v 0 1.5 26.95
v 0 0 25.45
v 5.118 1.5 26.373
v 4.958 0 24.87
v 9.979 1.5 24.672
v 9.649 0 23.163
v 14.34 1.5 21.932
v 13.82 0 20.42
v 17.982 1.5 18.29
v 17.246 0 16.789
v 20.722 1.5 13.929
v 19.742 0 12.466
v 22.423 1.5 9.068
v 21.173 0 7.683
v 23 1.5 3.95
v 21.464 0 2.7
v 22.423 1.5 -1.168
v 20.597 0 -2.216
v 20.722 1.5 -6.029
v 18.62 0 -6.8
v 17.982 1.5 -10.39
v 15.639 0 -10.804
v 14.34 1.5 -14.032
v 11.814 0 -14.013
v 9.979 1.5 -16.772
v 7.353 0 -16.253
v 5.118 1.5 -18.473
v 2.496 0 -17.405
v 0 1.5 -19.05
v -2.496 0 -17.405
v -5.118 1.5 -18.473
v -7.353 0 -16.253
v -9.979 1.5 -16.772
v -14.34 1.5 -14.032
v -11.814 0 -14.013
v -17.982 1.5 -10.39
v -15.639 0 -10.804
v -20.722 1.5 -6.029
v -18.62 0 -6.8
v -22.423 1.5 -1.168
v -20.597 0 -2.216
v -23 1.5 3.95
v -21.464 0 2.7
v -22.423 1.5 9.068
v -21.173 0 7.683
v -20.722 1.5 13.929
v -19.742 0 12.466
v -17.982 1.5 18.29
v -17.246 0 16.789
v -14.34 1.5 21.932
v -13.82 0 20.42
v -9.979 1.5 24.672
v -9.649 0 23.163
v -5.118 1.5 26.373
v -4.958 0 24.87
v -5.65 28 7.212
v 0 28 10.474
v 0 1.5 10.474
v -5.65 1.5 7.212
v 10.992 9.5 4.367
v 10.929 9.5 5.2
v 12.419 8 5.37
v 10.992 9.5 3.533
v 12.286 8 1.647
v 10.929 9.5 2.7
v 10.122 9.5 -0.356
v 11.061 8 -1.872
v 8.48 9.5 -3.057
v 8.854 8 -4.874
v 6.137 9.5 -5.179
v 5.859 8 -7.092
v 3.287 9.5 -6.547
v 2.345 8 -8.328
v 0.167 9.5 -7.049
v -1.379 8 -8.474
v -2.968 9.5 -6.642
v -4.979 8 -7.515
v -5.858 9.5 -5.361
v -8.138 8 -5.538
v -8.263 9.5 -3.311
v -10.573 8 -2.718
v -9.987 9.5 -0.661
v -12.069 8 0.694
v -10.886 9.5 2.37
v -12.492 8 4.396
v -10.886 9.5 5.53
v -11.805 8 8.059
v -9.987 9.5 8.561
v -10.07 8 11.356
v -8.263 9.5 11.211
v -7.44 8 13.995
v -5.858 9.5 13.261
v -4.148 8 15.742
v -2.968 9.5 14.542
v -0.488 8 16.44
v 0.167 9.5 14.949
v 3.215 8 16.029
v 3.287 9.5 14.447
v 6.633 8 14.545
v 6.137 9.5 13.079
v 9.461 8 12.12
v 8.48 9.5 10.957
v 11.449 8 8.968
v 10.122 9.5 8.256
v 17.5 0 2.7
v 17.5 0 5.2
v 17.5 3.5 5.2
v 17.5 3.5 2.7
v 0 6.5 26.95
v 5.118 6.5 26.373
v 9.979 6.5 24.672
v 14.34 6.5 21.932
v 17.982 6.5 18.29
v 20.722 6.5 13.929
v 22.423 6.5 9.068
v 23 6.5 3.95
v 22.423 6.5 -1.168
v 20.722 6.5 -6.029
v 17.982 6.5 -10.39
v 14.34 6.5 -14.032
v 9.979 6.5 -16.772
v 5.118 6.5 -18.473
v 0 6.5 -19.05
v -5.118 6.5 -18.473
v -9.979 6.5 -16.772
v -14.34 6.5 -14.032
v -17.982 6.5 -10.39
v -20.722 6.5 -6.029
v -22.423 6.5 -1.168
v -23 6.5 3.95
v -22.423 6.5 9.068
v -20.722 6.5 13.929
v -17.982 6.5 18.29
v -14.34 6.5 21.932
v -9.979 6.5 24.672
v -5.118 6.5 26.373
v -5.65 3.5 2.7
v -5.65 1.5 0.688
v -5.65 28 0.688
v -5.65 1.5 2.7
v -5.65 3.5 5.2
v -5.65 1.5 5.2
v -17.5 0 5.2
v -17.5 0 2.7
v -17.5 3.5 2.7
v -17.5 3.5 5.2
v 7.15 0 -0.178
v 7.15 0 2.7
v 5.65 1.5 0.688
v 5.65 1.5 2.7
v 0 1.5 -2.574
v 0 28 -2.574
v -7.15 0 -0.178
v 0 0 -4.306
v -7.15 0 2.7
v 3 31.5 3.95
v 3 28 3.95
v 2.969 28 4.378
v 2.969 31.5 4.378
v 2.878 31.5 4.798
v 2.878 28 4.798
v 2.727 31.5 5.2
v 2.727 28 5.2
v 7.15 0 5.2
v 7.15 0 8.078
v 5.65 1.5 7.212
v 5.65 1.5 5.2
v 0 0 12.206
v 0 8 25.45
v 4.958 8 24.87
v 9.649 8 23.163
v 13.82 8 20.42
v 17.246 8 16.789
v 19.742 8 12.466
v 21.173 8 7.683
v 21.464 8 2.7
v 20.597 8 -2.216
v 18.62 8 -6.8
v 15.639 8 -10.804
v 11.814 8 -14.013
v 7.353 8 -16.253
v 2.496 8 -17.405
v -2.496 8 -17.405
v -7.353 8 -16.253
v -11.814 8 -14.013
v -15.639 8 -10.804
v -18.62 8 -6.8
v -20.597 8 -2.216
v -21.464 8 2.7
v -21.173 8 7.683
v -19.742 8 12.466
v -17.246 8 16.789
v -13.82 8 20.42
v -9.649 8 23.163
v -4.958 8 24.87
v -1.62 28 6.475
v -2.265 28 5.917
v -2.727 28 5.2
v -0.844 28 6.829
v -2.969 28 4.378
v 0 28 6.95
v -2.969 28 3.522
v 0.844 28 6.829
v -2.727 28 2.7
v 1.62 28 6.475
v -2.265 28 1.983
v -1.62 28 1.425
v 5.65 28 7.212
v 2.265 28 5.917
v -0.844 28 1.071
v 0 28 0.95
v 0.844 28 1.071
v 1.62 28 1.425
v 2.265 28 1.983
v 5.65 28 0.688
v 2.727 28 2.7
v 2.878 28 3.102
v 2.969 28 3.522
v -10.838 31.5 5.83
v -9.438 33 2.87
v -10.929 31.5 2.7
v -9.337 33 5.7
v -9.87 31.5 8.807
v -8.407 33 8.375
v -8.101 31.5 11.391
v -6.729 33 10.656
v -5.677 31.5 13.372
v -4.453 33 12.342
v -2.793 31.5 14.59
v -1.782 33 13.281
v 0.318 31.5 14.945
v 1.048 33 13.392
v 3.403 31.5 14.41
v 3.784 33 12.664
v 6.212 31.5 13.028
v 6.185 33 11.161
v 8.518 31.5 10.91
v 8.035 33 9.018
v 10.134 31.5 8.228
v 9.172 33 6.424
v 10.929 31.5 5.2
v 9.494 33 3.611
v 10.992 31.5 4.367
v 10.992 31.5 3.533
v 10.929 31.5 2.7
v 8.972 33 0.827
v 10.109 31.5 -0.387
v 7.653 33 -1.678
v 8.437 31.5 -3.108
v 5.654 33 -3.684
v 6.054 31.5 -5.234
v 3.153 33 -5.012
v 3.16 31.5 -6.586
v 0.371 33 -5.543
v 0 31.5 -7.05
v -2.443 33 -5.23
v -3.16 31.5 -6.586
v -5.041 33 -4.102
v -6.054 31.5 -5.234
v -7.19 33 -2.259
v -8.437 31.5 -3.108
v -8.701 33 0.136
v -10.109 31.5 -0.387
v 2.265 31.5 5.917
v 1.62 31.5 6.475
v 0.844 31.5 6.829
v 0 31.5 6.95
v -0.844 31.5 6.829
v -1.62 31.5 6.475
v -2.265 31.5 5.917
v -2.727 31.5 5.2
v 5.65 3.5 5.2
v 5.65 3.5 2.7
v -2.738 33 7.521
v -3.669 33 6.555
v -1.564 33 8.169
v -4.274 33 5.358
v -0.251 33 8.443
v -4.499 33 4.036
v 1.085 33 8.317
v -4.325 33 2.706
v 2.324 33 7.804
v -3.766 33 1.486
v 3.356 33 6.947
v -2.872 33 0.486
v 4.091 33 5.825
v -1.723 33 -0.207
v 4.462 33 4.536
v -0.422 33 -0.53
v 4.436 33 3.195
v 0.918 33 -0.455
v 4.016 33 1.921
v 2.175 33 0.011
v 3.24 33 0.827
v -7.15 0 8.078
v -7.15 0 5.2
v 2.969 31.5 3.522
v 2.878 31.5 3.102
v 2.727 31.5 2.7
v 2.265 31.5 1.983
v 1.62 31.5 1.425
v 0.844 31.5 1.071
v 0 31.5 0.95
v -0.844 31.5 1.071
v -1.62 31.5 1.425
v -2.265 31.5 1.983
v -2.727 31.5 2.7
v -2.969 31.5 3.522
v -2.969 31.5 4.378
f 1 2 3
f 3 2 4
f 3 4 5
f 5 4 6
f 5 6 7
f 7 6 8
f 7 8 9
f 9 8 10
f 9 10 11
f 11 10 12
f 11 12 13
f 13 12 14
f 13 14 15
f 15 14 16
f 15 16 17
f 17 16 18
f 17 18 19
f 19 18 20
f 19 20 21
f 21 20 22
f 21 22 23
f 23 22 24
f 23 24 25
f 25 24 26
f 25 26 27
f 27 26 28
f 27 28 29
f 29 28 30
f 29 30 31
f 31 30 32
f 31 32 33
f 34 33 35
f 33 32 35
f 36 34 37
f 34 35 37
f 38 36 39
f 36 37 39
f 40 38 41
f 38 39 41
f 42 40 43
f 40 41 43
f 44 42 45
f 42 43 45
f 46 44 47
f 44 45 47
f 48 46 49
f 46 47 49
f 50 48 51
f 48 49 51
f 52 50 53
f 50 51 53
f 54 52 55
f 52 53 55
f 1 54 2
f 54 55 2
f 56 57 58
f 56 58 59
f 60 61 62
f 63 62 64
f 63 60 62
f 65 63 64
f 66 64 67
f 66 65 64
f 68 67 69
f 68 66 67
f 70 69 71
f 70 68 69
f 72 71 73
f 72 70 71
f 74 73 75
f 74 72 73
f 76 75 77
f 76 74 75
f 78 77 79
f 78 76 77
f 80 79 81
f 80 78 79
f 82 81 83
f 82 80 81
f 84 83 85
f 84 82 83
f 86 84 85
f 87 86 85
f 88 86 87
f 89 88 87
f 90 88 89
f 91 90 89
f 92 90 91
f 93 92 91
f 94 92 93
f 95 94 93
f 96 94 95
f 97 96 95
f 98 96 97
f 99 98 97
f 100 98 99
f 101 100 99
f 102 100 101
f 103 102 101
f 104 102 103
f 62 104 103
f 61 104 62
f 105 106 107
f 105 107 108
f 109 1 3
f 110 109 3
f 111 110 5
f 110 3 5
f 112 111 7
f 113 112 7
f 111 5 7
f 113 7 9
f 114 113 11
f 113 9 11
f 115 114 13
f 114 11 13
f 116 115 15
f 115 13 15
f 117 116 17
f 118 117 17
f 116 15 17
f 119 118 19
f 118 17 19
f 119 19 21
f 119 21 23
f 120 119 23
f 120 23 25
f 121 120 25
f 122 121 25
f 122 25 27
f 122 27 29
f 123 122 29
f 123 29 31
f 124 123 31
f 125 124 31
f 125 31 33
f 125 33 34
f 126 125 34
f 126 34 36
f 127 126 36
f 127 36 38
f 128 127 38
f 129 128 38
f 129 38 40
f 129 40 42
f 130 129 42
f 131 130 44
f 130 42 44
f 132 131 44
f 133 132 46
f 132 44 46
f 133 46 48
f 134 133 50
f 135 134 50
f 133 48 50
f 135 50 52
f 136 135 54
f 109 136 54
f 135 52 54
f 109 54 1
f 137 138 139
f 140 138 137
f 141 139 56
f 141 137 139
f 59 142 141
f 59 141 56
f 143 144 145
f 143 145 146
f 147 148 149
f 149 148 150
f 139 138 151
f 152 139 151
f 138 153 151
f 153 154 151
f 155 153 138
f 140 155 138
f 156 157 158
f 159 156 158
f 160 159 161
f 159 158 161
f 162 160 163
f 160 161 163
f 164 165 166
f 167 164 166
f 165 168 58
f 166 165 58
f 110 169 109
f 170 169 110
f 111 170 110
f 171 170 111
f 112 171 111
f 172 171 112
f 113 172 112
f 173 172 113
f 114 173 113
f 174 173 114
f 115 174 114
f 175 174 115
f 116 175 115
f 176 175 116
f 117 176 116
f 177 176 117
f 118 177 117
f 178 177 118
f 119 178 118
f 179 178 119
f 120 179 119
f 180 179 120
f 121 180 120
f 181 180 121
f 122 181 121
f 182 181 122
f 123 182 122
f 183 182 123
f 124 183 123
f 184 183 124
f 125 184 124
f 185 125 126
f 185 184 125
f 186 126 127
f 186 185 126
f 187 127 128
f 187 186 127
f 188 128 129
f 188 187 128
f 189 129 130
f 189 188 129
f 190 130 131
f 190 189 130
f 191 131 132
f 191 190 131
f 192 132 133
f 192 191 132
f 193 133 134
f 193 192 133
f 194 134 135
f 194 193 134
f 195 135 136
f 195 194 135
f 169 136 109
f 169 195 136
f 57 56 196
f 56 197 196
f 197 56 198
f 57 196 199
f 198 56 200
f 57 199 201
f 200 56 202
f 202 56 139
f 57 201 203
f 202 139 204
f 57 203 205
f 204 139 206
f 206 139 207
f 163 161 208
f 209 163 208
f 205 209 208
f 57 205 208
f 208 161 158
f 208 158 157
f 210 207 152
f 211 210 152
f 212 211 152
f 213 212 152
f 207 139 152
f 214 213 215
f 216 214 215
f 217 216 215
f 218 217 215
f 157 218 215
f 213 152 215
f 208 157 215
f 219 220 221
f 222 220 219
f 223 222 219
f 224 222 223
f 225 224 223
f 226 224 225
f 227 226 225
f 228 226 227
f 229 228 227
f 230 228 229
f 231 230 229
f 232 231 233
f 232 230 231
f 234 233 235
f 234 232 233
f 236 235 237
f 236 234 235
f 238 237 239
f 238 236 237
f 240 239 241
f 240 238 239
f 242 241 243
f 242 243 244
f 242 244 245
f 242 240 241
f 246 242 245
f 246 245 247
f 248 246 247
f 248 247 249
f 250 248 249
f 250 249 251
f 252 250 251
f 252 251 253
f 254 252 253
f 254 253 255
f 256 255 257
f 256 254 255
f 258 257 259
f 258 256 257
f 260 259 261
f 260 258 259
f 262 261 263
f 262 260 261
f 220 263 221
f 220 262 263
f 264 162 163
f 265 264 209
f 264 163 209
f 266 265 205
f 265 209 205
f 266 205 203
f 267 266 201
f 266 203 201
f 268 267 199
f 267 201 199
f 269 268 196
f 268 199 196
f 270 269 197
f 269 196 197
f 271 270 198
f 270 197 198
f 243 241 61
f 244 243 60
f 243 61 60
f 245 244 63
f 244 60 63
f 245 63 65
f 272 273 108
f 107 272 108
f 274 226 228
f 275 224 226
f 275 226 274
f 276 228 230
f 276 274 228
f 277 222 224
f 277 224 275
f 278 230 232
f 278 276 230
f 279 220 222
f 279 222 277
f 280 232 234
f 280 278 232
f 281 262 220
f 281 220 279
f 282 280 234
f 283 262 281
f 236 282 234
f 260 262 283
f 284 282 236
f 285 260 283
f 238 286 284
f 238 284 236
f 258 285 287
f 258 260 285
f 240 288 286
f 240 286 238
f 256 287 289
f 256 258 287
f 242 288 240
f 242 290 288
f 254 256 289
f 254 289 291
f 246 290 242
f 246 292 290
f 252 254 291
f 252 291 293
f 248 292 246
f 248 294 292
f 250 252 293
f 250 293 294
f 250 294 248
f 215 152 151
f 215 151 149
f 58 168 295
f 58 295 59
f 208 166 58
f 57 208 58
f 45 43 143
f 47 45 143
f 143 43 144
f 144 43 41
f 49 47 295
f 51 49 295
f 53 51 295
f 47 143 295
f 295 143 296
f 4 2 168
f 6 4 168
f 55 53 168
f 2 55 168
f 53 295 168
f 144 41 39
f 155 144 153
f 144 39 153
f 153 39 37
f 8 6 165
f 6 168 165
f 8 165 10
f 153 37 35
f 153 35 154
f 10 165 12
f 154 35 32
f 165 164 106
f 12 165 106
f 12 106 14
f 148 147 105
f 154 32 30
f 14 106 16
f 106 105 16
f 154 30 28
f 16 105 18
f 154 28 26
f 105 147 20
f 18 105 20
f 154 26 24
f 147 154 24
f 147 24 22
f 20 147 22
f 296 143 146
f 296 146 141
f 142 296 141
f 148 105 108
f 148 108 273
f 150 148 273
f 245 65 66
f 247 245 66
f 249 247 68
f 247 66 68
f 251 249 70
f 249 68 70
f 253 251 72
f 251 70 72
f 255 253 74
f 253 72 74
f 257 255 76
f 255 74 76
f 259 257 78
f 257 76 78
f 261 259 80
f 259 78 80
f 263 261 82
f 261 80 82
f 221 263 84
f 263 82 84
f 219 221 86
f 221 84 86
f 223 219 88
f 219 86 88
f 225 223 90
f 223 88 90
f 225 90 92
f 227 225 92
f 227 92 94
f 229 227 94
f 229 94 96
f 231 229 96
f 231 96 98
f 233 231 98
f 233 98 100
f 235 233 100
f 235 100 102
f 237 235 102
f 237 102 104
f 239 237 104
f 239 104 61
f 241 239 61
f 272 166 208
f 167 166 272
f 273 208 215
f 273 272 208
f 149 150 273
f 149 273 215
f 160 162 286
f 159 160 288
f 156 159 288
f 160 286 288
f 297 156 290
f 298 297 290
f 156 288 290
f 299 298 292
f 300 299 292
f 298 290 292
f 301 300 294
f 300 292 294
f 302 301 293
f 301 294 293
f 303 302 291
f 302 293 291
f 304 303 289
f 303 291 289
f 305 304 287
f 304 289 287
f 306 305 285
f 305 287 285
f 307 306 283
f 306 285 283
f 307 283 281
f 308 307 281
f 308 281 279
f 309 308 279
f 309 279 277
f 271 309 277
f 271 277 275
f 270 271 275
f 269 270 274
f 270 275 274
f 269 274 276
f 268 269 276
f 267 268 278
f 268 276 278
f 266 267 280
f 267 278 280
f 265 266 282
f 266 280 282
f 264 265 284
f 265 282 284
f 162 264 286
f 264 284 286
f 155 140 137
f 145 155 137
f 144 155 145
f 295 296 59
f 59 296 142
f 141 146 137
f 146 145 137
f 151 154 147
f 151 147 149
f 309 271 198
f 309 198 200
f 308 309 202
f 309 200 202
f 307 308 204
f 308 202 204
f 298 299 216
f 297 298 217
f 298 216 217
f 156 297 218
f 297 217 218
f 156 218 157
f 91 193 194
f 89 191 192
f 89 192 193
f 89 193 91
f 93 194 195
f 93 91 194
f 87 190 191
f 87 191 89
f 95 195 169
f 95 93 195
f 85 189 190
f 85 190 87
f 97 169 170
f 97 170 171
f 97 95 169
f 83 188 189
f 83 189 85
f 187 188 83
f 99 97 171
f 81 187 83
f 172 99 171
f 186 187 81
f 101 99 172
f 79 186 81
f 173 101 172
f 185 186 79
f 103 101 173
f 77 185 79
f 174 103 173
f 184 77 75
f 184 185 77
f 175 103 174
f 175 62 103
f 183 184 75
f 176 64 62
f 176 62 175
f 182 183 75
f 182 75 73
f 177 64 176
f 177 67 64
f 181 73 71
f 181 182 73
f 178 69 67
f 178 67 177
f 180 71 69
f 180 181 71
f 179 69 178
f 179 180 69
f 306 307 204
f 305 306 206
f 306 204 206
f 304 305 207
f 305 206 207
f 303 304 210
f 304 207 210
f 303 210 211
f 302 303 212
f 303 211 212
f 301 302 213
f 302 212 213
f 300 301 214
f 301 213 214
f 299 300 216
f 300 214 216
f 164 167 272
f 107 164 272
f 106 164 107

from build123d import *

# Parameters (mm, degrees)
SKETCH1_R           = 23
SKETCH1_R_2         = 11
BOSS_EXTRUDE1_DEPTH = 8
CUT_EXTRUDE1_DEPTH  = 3.5
BOSS_EXTRUDE2_START = 8
BOSS_EXTRUDE2_DEPTH = 20
BOSS_EXTRUDE3_START = 28
BOSS_EXTRUDE3_DEPTH = 5
CHAMFER1_SIZE       = 1.5


with BuildPart() as part:
    # Sketch1 → Boss-Extrude1 (new body)
    # profile 1 of 7: a face of its own
    with BuildSketch(Plane(origin=(0, 0, 0), x_dir=(1, 0, 0), z_dir=(0, 1, 0))):
        with Locations(Location((0, -3.95, 0), (0, 0, 270))):
            Circle(SKETCH1_R)
        with Locations((0, -3.95)):
            Circle(SKETCH1_R_2, mode=Mode.SUBTRACT)
    # profile 2 of 7: a face of its own
    with BuildSketch(Plane(origin=(0, 0, 0), x_dir=(1, 0, 0), z_dir=(0, 1, 0))):
        with Locations((0, -3.95)):
            Circle(SKETCH1_R_2)
        Polygon((0, -10.474058042), (5.65, -7.212029021), (5.65, -0.687970979), (0, 2.574058042), (-5.65, -0.687970979), (-5.65, -7.212029021), align=None, mode=Mode.SUBTRACT)
    # profile 3 of 7: a face of its own
    with BuildSketch(Plane(origin=(0, 0, 0), x_dir=(1, 0, 0), z_dir=(0, 1, 0))):
        with BuildLine():
            Line((5.65, -5.2), (5.65, -7.212029021))
            Line((5.65, -7.212029021), (0, -10.474058042))
            Line((0, -10.474058042), (-5.65, -7.212029021))
            Line((-5.65, -7.212029021), (-5.65, -5.2))
            Line((-5.65, -5.2), (-10.928746497, -5.2))
            ThreePointArc((-10.928746497, -5.2), (0, -14.95), (10.928746497, -5.2))
            Line((10.928746497, -5.2), (5.65, -5.2))
        make_face()
    # profile 4 of 7: a face of its own
    with BuildSketch(Plane(origin=(0, 0, 0), x_dir=(1, 0, 0), z_dir=(0, 1, 0))):
        with BuildLine():
            Line((-17.5, -5.2), (-10.928746497, -5.2))
            ThreePointArc((-10.928746497, -5.2), (-11, -3.95), (-10.928746497, -2.7))
            Line((-10.928746497, -2.7), (-17.5, -2.7))
            Line((-17.5, -2.7), (-17.5, -5.2))
        make_face()
    # profile 5 of 7: a face of its own
    with BuildSketch(Plane(origin=(0, 0, 0), x_dir=(1, 0, 0), z_dir=(0, 1, 0))):
        with BuildLine():
            ThreePointArc((11, -3.95), (10.982172177, -4.576014589), (10.928746497, -5.2))
            Line((10.928746497, -5.2), (17.5, -5.2))
            Line((17.5, -5.2), (17.5, -2.7))
            Line((17.5, -2.7), (10.928746497, -2.7))
            ThreePointArc((10.928746497, -2.7), (10.982172177, -3.323985411), (11, -3.95))
        make_face()
    # profile 6 of 7: a face of its own
    with BuildSketch(Plane(origin=(0, 0, 0), x_dir=(1, 0, 0), z_dir=(0, 1, 0))):
        with BuildLine():
            Line((5.65, -2.7), (5.65, -5.2))
            Line((5.65, -5.2), (10.928746497, -5.2))
            ThreePointArc((10.928746497, -5.2), (10.982172177, -4.576014589), (11, -3.95))
            ThreePointArc((11, -3.95), (10.982172177, -3.323985411), (10.928746497, -2.7))
            Line((10.928746497, -2.7), (5.65, -2.7))
        make_face()
    # profile 7 of 7: a face of its own
    with BuildSketch(Plane(origin=(0, 0, 0), x_dir=(1, 0, 0), z_dir=(0, 1, 0))):
        with BuildLine():
            ThreePointArc((-10.928746497, -2.7), (-11, -3.95), (-10.928746497, -5.2))
            Line((-10.928746497, -5.2), (-5.65, -5.2))
            Line((-5.65, -5.2), (-5.65, -2.7))
            Line((-5.65, -2.7), (-10.928746497, -2.7))
        make_face()
    extrude(amount=BOSS_EXTRUDE1_DEPTH)

    # Sketch1<4> → Cut-Extrude1 (cut)
    with BuildSketch(Plane(origin=(0, 0, 0), x_dir=(1, 0, 0), z_dir=(0, 1, 0))):
        with BuildLine():
            Line((-17.5, -5.2), (-10.928746497, -5.2))
            ThreePointArc((-10.928746497, -5.2), (-11, -3.95), (-10.928746497, -2.7))
            Line((-10.928746497, -2.7), (-17.5, -2.7))
            Line((-17.5, -2.7), (-17.5, -5.2))
        make_face()
        with BuildLine():
            ThreePointArc((-10.928746497, -2.7), (-11, -3.95), (-10.928746497, -5.2))
            Line((-10.928746497, -5.2), (-5.65, -5.2))
            Line((-5.65, -5.2), (-5.65, -2.7))
            Line((-5.65, -2.7), (-10.928746497, -2.7))
        make_face()
        with BuildLine():
            Line((5.65, -2.7), (5.65, -5.2))
            Line((5.65, -5.2), (10.928746497, -5.2))
            ThreePointArc((10.928746497, -5.2), (10.982172177, -4.576014589), (11, -3.95))
            ThreePointArc((11, -3.95), (10.982172177, -3.323985411), (10.928746497, -2.7))
            Line((10.928746497, -2.7), (5.65, -2.7))
        make_face()
        with BuildLine():
            ThreePointArc((11, -3.95), (10.982172177, -4.576014589), (10.928746497, -5.2))
            Line((10.928746497, -5.2), (17.5, -5.2))
            Line((17.5, -5.2), (17.5, -2.7))
            Line((17.5, -2.7), (10.928746497, -2.7))
            ThreePointArc((10.928746497, -2.7), (10.982172177, -3.323985411), (11, -3.95))
        make_face()
    extrude(amount=CUT_EXTRUDE1_DEPTH, mode=Mode.SUBTRACT)

    # Sketch1<5> → Boss-Extrude2 (add)
    with BuildSketch(Plane(origin=(0, 0, 0), x_dir=(1, 0, 0), z_dir=(0, 1, 0)).offset(BOSS_EXTRUDE2_START)):
        with BuildLine():
            Line((5.65, -5.2), (5.65, -7.212029021))
            Line((5.65, -7.212029021), (0, -10.474058042))
            Line((0, -10.474058042), (-5.65, -7.212029021))
            Line((-5.65, -7.212029021), (-5.65, -5.2))
            Line((-5.65, -5.2), (-10.928746497, -5.2))
            ThreePointArc((-10.928746497, -5.2), (0, -14.95), (10.928746497, -5.2))
            Line((10.928746497, -5.2), (5.65, -5.2))
        make_face()
        with BuildLine():
            Line((5.65, -0.687970979), (5.65, -2.7))
            Line((5.65, -2.7), (10.928746497, -2.7))
            ThreePointArc((10.928746497, -2.7), (0, 7.05), (-10.928746497, -2.7))
            Line((-10.928746497, -2.7), (-5.65, -2.7))
            Line((-5.65, -2.7), (-5.65, -0.687970979))
            Line((-5.65, -0.687970979), (0, 2.574058042))
            Line((0, 2.574058042), (5.65, -0.687970979))
        make_face()
        with BuildLine():
            ThreePointArc((-10.928746497, -2.7), (-11, -3.95), (-10.928746497, -5.2))
            Line((-10.928746497, -5.2), (-5.65, -5.2))
            Line((-5.65, -5.2), (-5.65, -2.7))
            Line((-5.65, -2.7), (-10.928746497, -2.7))
        make_face()
        with BuildLine():
            Line((5.65, -2.7), (5.65, -5.2))
            Line((5.65, -5.2), (10.928746497, -5.2))
            ThreePointArc((10.928746497, -5.2), (10.982172177, -4.576014589), (11, -3.95))
            ThreePointArc((11, -3.95), (10.982172177, -3.323985411), (10.928746497, -2.7))
            Line((10.928746497, -2.7), (5.65, -2.7))
        make_face()
    extrude(amount=BOSS_EXTRUDE2_DEPTH)

    # Sketch1<6> → Boss-Extrude3 (add)
    with BuildSketch(Plane(origin=(0, 0, 0), x_dir=(1, 0, 0), z_dir=(0, 1, 0)).offset(BOSS_EXTRUDE3_START)):
        with BuildLine():
            Line((5.65, -5.2), (5.65, -7.212029021))
            Line((5.65, -7.212029021), (0, -10.474058042))
            Line((0, -10.474058042), (-5.65, -7.212029021))
            Line((-5.65, -7.212029021), (-5.65, -5.2))
            Line((-5.65, -5.2), (-10.928746497, -5.2))
            ThreePointArc((-10.928746497, -5.2), (0, -14.95), (10.928746497, -5.2))
            Line((10.928746497, -5.2), (5.65, -5.2))
        make_face()
        with BuildLine():
            Line((0, -10.474058042), (5.65, -7.212029021))
            Line((5.65, -7.212029021), (5.65, -5.2))
            Line((5.65, -5.2), (2.727178029, -5.2))
            ThreePointArc((2.727178029, -5.2), (0, -6.95), (-2.727178029, -5.2))
            Line((-2.727178029, -5.2), (-5.65, -5.2))
            Line((-5.65, -5.2), (-5.65, -7.212029021))
            Line((-5.65, -7.212029021), (0, -10.474058042))
        make_face()
        with BuildLine():
            Line((2.727178029, -2.7), (5.65, -2.7))
            Line((5.65, -2.7), (5.65, -0.687970979))
            Line((5.65, -0.687970979), (0, 2.574058042))
            Line((0, 2.574058042), (-5.65, -0.687970979))
            Line((-5.65, -0.687970979), (-5.65, -2.7))
            Line((-5.65, -2.7), (-2.727178029, -2.7))
            ThreePointArc((-2.727178029, -2.7), (0, -0.95), (2.727178029, -2.7))
        make_face()
        with BuildLine():
            Line((5.65, -0.687970979), (5.65, -2.7))
            Line((5.65, -2.7), (10.928746497, -2.7))
            ThreePointArc((10.928746497, -2.7), (0, 7.05), (-10.928746497, -2.7))
            Line((-10.928746497, -2.7), (-5.65, -2.7))
            Line((-5.65, -2.7), (-5.65, -0.687970979))
            Line((-5.65, -0.687970979), (0, 2.574058042))
            Line((0, 2.574058042), (5.65, -0.687970979))
        make_face()
        with BuildLine():
            Line((5.65, -2.7), (5.65, -5.2))
            Line((5.65, -5.2), (10.928746497, -5.2))
            ThreePointArc((10.928746497, -5.2), (10.982172177, -4.576014589), (11, -3.95))
            ThreePointArc((11, -3.95), (10.982172177, -3.323985411), (10.928746497, -2.7))
            Line((10.928746497, -2.7), (5.65, -2.7))
        make_face()
        with BuildLine():
            ThreePointArc((-10.928746497, -2.7), (-11, -3.95), (-10.928746497, -5.2))
            Line((-10.928746497, -5.2), (-5.65, -5.2))
            Line((-5.65, -5.2), (-5.65, -2.7))
            Line((-5.65, -2.7), (-10.928746497, -2.7))
        make_face()
        with BuildLine():
            Line((2.727178029, -5.2), (5.65, -5.2))
            Line((5.65, -5.2), (5.65, -2.7))
            Line((5.65, -2.7), (2.727178029, -2.7))
            ThreePointArc((2.727178029, -2.7), (2.931001031, -3.310286817), (3, -3.95))
            ThreePointArc((3, -3.95), (2.931001031, -4.589713183), (2.727178029, -5.2))
        make_face()
        with BuildLine():
            Line((-5.65, -5.2), (-2.727178029, -5.2))
            ThreePointArc((-2.727178029, -5.2), (-3, -3.95), (-2.727178029, -2.7))
            Line((-2.727178029, -2.7), (-5.65, -2.7))
            Line((-5.65, -2.7), (-5.65, -5.2))
        make_face()
    extrude(amount=BOSS_EXTRUDE3_DEPTH)

    # Chamfer1
    # the kernel refuses this chamfer: 1.5 mm, written as the material it adds along each edge
    with BuildSketch(Plane(origin=(0, 8, 3.95), x_dir=(0.9935224088361082, 0, 0.11363636363636874), z_dir=(-0.11363636363636874, 0, 0.9935224088361082))) as chamfer1_piece_1:
        Polygon((11 + CHAMFER1_SIZE, 0), (11, CHAMFER1_SIZE), (11, 0), align=None)
    revolve(axis=Axis((0, 8, 3.95), (0, 1, 0)))
    # the kernel refuses this chamfer: 1.5 mm, written as the material it takes off along each edge
    with BuildSketch(Plane(origin=(-8.990714197, 0, 5.28326678), x_dir=(-0.4998109584556484, -0.027495876610586358, 0.8656979742248804), z_dir=(0.8660254037844387, 0, 0.49999999999999994))) as chamfer1_2_piece_1_section:
        Polygon((CHAMFER1_SIZE * 0.999621916911, -CHAMFER1_SIZE * 0.0274958766106), (-CHAMFER1_SIZE * 0.0274958766106, -CHAMFER1_SIZE * 0.999621916911), (0, 0), align=None)
    chamfer1_2_piece_1 = extrude(amount=14.239107006, mode=Mode.PRIVATE)
    chamfer1_2_piece_1 = split(chamfer1_2_piece_1, bisect_by=Plane(origin=(-5.65, 0.509507135, 9.247455904), z_dir=(1, 0, 0)), keep=Keep.TOP, mode=Mode.PRIVATE)
    chamfer1_2_piece_1 = split(chamfer1_2_piece_1, bisect_by=Plane(origin=(-1.762731388, 0.509507135, 11.491771483), z_dir=(-0.5000000000000003, 0, -0.8660254037844385)), keep=Keep.TOP, mode=Mode.PRIVATE)
    add(chamfer1_2_piece_1, mode=Mode.SUBTRACT)
    with BuildSketch(Plane(origin=(-3.340714197, 0, 12.402820283), x_dir=(0.49981095845564866, -0.02749587661058636, 0.86569797422488), z_dir=(0.8660254037844385, 0, -0.5000000000000003))) as chamfer1_2_piece_2_section:
        Polygon((CHAMFER1_SIZE * 0.999621916911, -CHAMFER1_SIZE * 0.0274958766106), (-CHAMFER1_SIZE * 0.0274958766106, -CHAMFER1_SIZE * 0.999621916911), (0, 0), align=None)
    chamfer1_2_piece_2 = extrude(amount=14.239107006, mode=Mode.PRIVATE)
    chamfer1_2_piece_2 = split(chamfer1_2_piece_2, bisect_by=Plane(origin=(5.65, 0.509507135, 9.247455904), z_dir=(-1, 0, 0)), keep=Keep.TOP, mode=Mode.PRIVATE)
    chamfer1_2_piece_2 = split(chamfer1_2_piece_2, bisect_by=Plane(origin=(1.762731388, 0.509507135, 11.491771483), z_dir=(0.49999999999999994, 0, -0.8660254037844387)), keep=Keep.TOP, mode=Mode.PRIVATE)
    add(chamfer1_2_piece_2, mode=Mode.SUBTRACT)
    with BuildSketch(Plane(origin=(5.65, 0, 11.069553503), x_dir=(0.9996219169112969, -0.027495876610586382, 0), z_dir=(0, 0, -1))) as chamfer1_2_piece_3_section:
        Polygon((CHAMFER1_SIZE * 0.999621916911, -CHAMFER1_SIZE * 0.0274958766106), (-CHAMFER1_SIZE * 0.0274958766106, -CHAMFER1_SIZE * 0.999621916911), (0, 0), align=None)
    chamfer1_2_piece_3 = extrude(amount=9.727077985, mode=Mode.PRIVATE)
    chamfer1_2_piece_3 = split(chamfer1_2_piece_3, bisect_by=Plane(origin=(7.340723273, 0.502588209, 6.235889484), z_dir=(-0.5000000000000003, 0, -0.8660254037844385)), keep=Keep.TOP, mode=Mode.PRIVATE)
    add(chamfer1_2_piece_3, mode=Mode.SUBTRACT)
    with BuildSketch(Plane(origin=(8.990714197, 0, 2.61673322), x_dir=(0.49981095845564816, -0.027495876610586365, -0.8656979742248805), z_dir=(-0.8660254037844388, 0, -0.4999999999999998))) as chamfer1_2_piece_4_section:
        Polygon((CHAMFER1_SIZE * 0.999621916911, -CHAMFER1_SIZE * 0.0274958766106), (-CHAMFER1_SIZE * 0.0274958766106, -CHAMFER1_SIZE * 0.999621916911), (0, 0), align=None)
    chamfer1_2_piece_4 = extrude(amount=14.239107006, mode=Mode.PRIVATE)
    chamfer1_2_piece_4 = split(chamfer1_2_piece_4, bisect_by=Plane(origin=(5.65, 0.509507135, -1.347455904), z_dir=(-1, 0, 0)), keep=Keep.TOP, mode=Mode.PRIVATE)
    chamfer1_2_piece_4 = split(chamfer1_2_piece_4, bisect_by=Plane(origin=(1.762731388, 0.509507135, -3.591771483), z_dir=(0.5000000000000001, 0, 0.8660254037844386)), keep=Keep.TOP, mode=Mode.PRIVATE)
    add(chamfer1_2_piece_4, mode=Mode.SUBTRACT)
    with BuildSketch(Plane(origin=(-5.65, 0, 1.342475518), x_dir=(-0.9996219169112969, -0.027495876610586382, 0), z_dir=(0, 0, 1))) as chamfer1_2_piece_5_section:
        Polygon((CHAMFER1_SIZE * 0.999621916911, -CHAMFER1_SIZE * 0.0274958766106), (-CHAMFER1_SIZE * 0.0274958766106, -CHAMFER1_SIZE * 0.999621916911), (0, 0), align=None)
    chamfer1_2_piece_5 = extrude(amount=9.727077985, mode=Mode.PRIVATE)
    chamfer1_2_piece_5 = split(chamfer1_2_piece_5, bisect_by=Plane(origin=(-7.340723273, 0.502588209, 6.235889484), z_dir=(0.49999999999999994, 0, -0.8660254037844387)), keep=Keep.TOP, mode=Mode.PRIVATE)
    add(chamfer1_2_piece_5, mode=Mode.SUBTRACT)
    with BuildSketch(Plane(origin=(5.65, 0, 6.557524482), x_dir=(0.9996219169112969, -0.027495876610586382, 0), z_dir=(0, 0, -1))) as chamfer1_2_piece_6_section:
        Polygon((CHAMFER1_SIZE * 0.999621916911, -CHAMFER1_SIZE * 0.0274958766106), (-CHAMFER1_SIZE * 0.0274958766106, -CHAMFER1_SIZE * 0.999621916911), (0, 0), align=None)
    chamfer1_2_piece_6 = extrude(amount=9.727077985, mode=Mode.PRIVATE)
    chamfer1_2_piece_6 = split(chamfer1_2_piece_6, bisect_by=Plane(origin=(7.340723273, 0.502588209, 1.664110516), z_dir=(-0.4999999999999998, 0, 0.8660254037844388)), keep=Keep.TOP, mode=Mode.PRIVATE)
    add(chamfer1_2_piece_6, mode=Mode.SUBTRACT)
    with BuildSketch(Plane(origin=(0, 8, 3.95), x_dir=(0, 0, 1), z_dir=(-1, 0, 0))) as chamfer1_2_piece_7:
        Polygon((23, -CHAMFER1_SIZE), (23 - CHAMFER1_SIZE, 0), (23, 0), align=None)
    revolve(axis=Axis((0, 8, 3.95), (0, 1, 0)), mode=Mode.SUBTRACT)
    with BuildSketch(Plane(origin=(0, 33, 3.95), x_dir=(-0.9935224088361069, 0, -0.1136363636363809), z_dir=(0.1136363636363809, 0, -0.9935224088361069))) as chamfer1_2_piece_8:
        Polygon((11, -CHAMFER1_SIZE), (11 - CHAMFER1_SIZE, 0), (11, 0), align=None)
    revolve(axis=Axis((0, 33, 3.95), (0, 1, 0)), mode=Mode.SUBTRACT)
    with BuildSketch(Plane(origin=(0, 33, 3.95), x_dir=(0.9090593428863087, 0, 0.4166666666666683), z_dir=(-0.4166666666666683, 0, 0.9090593428863087))) as chamfer1_2_piece_9:
        Polygon((3, -CHAMFER1_SIZE), (3 + CHAMFER1_SIZE, 0), (3, 0), align=None)
    revolve(axis=Axis((0, 33, 3.95), (0, 1, 0)), mode=Mode.SUBTRACT)
    with BuildSketch(Plane(origin=(0, 0, 3.95), x_dir=(0, 0, 1), z_dir=(-1, 0, 0))) as chamfer1_2_piece_10:
        Polygon((23, CHAMFER1_SIZE), (23 - CHAMFER1_SIZE, 0), (23, 0), align=None)
    revolve(axis=Axis((0, 0, 3.95), (0, 1, 0)), mode=Mode.SUBTRACT)
    with BuildSketch(Plane(origin=(3.340714197, 0, -4.502820283), x_dir=(-0.4998109584556485, -0.027495876610586382, -0.8656979742248803), z_dir=(-0.8660254037844386, 0, 0.5000000000000001))) as chamfer1_2_piece_11_section:
        Polygon((CHAMFER1_SIZE * 0.999621916911, -CHAMFER1_SIZE * 0.0274958766106), (-CHAMFER1_SIZE * 0.0274958766106, -CHAMFER1_SIZE * 0.999621916911), (0, 0), align=None)
    chamfer1_2_piece_11 = extrude(amount=14.239107006, mode=Mode.PRIVATE)
    chamfer1_2_piece_11 = split(chamfer1_2_piece_11, bisect_by=Plane(origin=(-1.762731388, 0.509507135, -3.591771483), z_dir=(-0.4999999999999998, 0, 0.8660254037844388)), keep=Keep.TOP, mode=Mode.PRIVATE)
    chamfer1_2_piece_11 = split(chamfer1_2_piece_11, bisect_by=Plane(origin=(-5.65, 0.509507135, -1.347455904), z_dir=(1, 0, 0)), keep=Keep.TOP, mode=Mode.PRIVATE)
    add(chamfer1_2_piece_11, mode=Mode.SUBTRACT)
    with BuildSketch(Plane(origin=(-5.65, 0, -3.169553503), x_dir=(-0.9996219169112969, -0.027495876610586382, 0), z_dir=(0, 0, 1))) as chamfer1_2_piece_12_section:
        Polygon((CHAMFER1_SIZE * 0.999621916911, -CHAMFER1_SIZE * 0.0274958766106), (-CHAMFER1_SIZE * 0.0274958766106, -CHAMFER1_SIZE * 0.999621916911), (0, 0), align=None)
    chamfer1_2_piece_12 = extrude(amount=9.727077985, mode=Mode.PRIVATE)
    chamfer1_2_piece_12 = split(chamfer1_2_piece_12, bisect_by=Plane(origin=(-7.340723273, 0.502588209, 1.664110516), z_dir=(0.5000000000000001, 0, 0.8660254037844386)), keep=Keep.TOP, mode=Mode.PRIVATE)
    add(chamfer1_2_piece_12, mode=Mode.SUBTRACT)
    with BuildSketch(Plane(origin=(-5.65, 0, 1.342475518), x_dir=(-0.9996219169112969, -0.027495876610586382, 0), z_dir=(0, 0, 1))) as chamfer1_2_piece_13a_section:
        Polygon((CHAMFER1_SIZE * 0.999621916911, -CHAMFER1_SIZE * 0.0274958766106), (-CHAMFER1_SIZE * 0.0274958766106, -CHAMFER1_SIZE * 0.999621916911), (0, 0), align=None)
    chamfer1_2_piece_13a = extrude(amount=9.727077985, mode=Mode.PRIVATE)
    chamfer1_2_piece_13a = split(chamfer1_2_piece_13a, bisect_by=Plane(origin=(-5.265097348, 0.484046156, 7.434252671), z_dir=(-0.49999999999999994, 0, 0.8660254037844387)), keep=Keep.TOP, mode=Mode.PRIVATE)
    with BuildSketch(Plane(origin=(-8.990714197, 0, 5.28326678), x_dir=(-0.4998109584556484, -0.027495876610586358, 0.8656979742248804), z_dir=(0.8660254037844387, 0, 0.49999999999999994))) as chamfer1_2_piece_13b_section:
        Polygon((CHAMFER1_SIZE * 0.999621916911, -CHAMFER1_SIZE * 0.0274958766106), (-CHAMFER1_SIZE * 0.0274958766106, -CHAMFER1_SIZE * 0.999621916911), (0, 0), align=None)
    chamfer1_2_piece_13b = extrude(amount=14.239107006, mode=Mode.PRIVATE)
    chamfer1_2_piece_13b = split(chamfer1_2_piece_13b, bisect_by=Plane(origin=(-5.65, 0.484046156, 6.767581721), z_dir=(-1, 0, 0)), keep=Keep.TOP, mode=Mode.PRIVATE)
    chamfer1_2_piece_13 = chamfer1_2_piece_13a & chamfer1_2_piece_13b
    add(chamfer1_2_piece_13, mode=Mode.SUBTRACT)
    with BuildSketch(Plane(origin=(-8.990714197, 0, 5.28326678), x_dir=(-0.4998109584556484, -0.027495876610586358, 0.8656979742248804), z_dir=(0.8660254037844387, 0, 0.49999999999999994))) as chamfer1_2_piece_14a_section:
        Polygon((CHAMFER1_SIZE * 0.999621916911, -CHAMFER1_SIZE * 0.0274958766106), (-CHAMFER1_SIZE * 0.0274958766106, -CHAMFER1_SIZE * 0.999621916911), (0, 0), align=None)
    chamfer1_2_piece_14a = extrude(amount=14.239107006, mode=Mode.PRIVATE)
    chamfer1_2_piece_14a = split(chamfer1_2_piece_14a, bisect_by=Plane(origin=(0.384902652, 0.484046156, 10.251834392), z_dir=(0.5000000000000003, 0, 0.8660254037844385)), keep=Keep.TOP, mode=Mode.PRIVATE)
    with BuildSketch(Plane(origin=(-3.340714197, 0, 12.402820283), x_dir=(0.49981095845564866, -0.02749587661058636, 0.86569797422488), z_dir=(0.8660254037844385, 0, -0.5000000000000003))) as chamfer1_2_piece_14b_section:
        Polygon((CHAMFER1_SIZE * 0.999621916911, -CHAMFER1_SIZE * 0.0274958766106), (-CHAMFER1_SIZE * 0.0274958766106, -CHAMFER1_SIZE * 0.999621916911), (0, 0), align=None)
    chamfer1_2_piece_14b = extrude(amount=14.239107006, mode=Mode.PRIVATE)
    chamfer1_2_piece_14b = split(chamfer1_2_piece_14b, bisect_by=Plane(origin=(-0.384902652, 0.484046156, 10.251834392), z_dir=(-0.49999999999999994, 0, 0.8660254037844387)), keep=Keep.TOP, mode=Mode.PRIVATE)
    chamfer1_2_piece_14 = chamfer1_2_piece_14a & chamfer1_2_piece_14b
    add(chamfer1_2_piece_14, mode=Mode.SUBTRACT)
    with BuildSketch(Plane(origin=(5.65, 0, 11.069553503), x_dir=(0.9996219169112969, -0.027495876610586382, 0), z_dir=(0, 0, -1))) as chamfer1_2_piece_15a_section:
        Polygon((CHAMFER1_SIZE * 0.999621916911, -CHAMFER1_SIZE * 0.0274958766106), (-CHAMFER1_SIZE * 0.0274958766106, -CHAMFER1_SIZE * 0.999621916911), (0, 0), align=None)
    chamfer1_2_piece_15a = extrude(amount=9.727077985, mode=Mode.PRIVATE)
    chamfer1_2_piece_15a = split(chamfer1_2_piece_15a, bisect_by=Plane(origin=(5.265097348, 0.484046156, 7.434252671), z_dir=(0.5000000000000003, 0, 0.8660254037844385)), keep=Keep.TOP, mode=Mode.PRIVATE)
    with BuildSketch(Plane(origin=(-3.340714197, 0, 12.402820283), x_dir=(0.49981095845564866, -0.02749587661058636, 0.86569797422488), z_dir=(0.8660254037844385, 0, -0.5000000000000003))) as chamfer1_2_piece_15b_section:
        Polygon((CHAMFER1_SIZE * 0.999621916911, -CHAMFER1_SIZE * 0.0274958766106), (-CHAMFER1_SIZE * 0.0274958766106, -CHAMFER1_SIZE * 0.999621916911), (0, 0), align=None)
    chamfer1_2_piece_15b = extrude(amount=14.239107006, mode=Mode.PRIVATE)
    chamfer1_2_piece_15b = split(chamfer1_2_piece_15b, bisect_by=Plane(origin=(5.65, 0.484046156, 6.767581721), z_dir=(1, 0, 0)), keep=Keep.TOP, mode=Mode.PRIVATE)
    chamfer1_2_piece_15 = chamfer1_2_piece_15a & chamfer1_2_piece_15b
    add(chamfer1_2_piece_15, mode=Mode.SUBTRACT)
    with BuildSketch(Plane(origin=(5.65, 0, 6.557524482), x_dir=(0.9996219169112969, -0.027495876610586382, 0), z_dir=(0, 0, -1))) as chamfer1_2_piece_16a_section:
        Polygon((CHAMFER1_SIZE * 0.999621916911, -CHAMFER1_SIZE * 0.0274958766106), (-CHAMFER1_SIZE * 0.0274958766106, -CHAMFER1_SIZE * 0.999621916911), (0, 0), align=None)
    chamfer1_2_piece_16a = extrude(amount=9.727077985, mode=Mode.PRIVATE)
    chamfer1_2_piece_16a = split(chamfer1_2_piece_16a, bisect_by=Plane(origin=(5.265097348, 0.484046156, 0.465747329), z_dir=(0.4999999999999998, 0, -0.8660254037844388)), keep=Keep.TOP, mode=Mode.PRIVATE)
    with BuildSketch(Plane(origin=(8.990714197, 0, 2.61673322), x_dir=(0.49981095845564816, -0.027495876610586365, -0.8656979742248805), z_dir=(-0.8660254037844388, 0, -0.4999999999999998))) as chamfer1_2_piece_16b_section:
        Polygon((CHAMFER1_SIZE * 0.999621916911, -CHAMFER1_SIZE * 0.0274958766106), (-CHAMFER1_SIZE * 0.0274958766106, -CHAMFER1_SIZE * 0.999621916911), (0, 0), align=None)
    chamfer1_2_piece_16b = extrude(amount=14.239107006, mode=Mode.PRIVATE)
    chamfer1_2_piece_16b = split(chamfer1_2_piece_16b, bisect_by=Plane(origin=(5.65, 0.484046156, 1.132418279), z_dir=(1, 0, 0)), keep=Keep.TOP, mode=Mode.PRIVATE)
    chamfer1_2_piece_16 = chamfer1_2_piece_16a & chamfer1_2_piece_16b
    add(chamfer1_2_piece_16, mode=Mode.SUBTRACT)
    with BuildSketch(Plane(origin=(8.990714197, 0, 2.61673322), x_dir=(0.49981095845564816, -0.027495876610586365, -0.8656979742248805), z_dir=(-0.8660254037844388, 0, -0.4999999999999998))) as chamfer1_2_piece_17a_section:
        Polygon((CHAMFER1_SIZE * 0.999621916911, -CHAMFER1_SIZE * 0.0274958766106), (-CHAMFER1_SIZE * 0.0274958766106, -CHAMFER1_SIZE * 0.999621916911), (0, 0), align=None)
    chamfer1_2_piece_17a = extrude(amount=14.239107006, mode=Mode.PRIVATE)
    chamfer1_2_piece_17a = split(chamfer1_2_piece_17a, bisect_by=Plane(origin=(-0.384902652, 0.484046156, -2.351834392), z_dir=(-0.5000000000000001, 0, -0.8660254037844386)), keep=Keep.TOP, mode=Mode.PRIVATE)
    with BuildSketch(Plane(origin=(3.340714197, 0, -4.502820283), x_dir=(-0.4998109584556485, -0.027495876610586382, -0.8656979742248803), z_dir=(-0.8660254037844386, 0, 0.5000000000000001))) as chamfer1_2_piece_17b_section:
        Polygon((CHAMFER1_SIZE * 0.999621916911, -CHAMFER1_SIZE * 0.0274958766106), (-CHAMFER1_SIZE * 0.0274958766106, -CHAMFER1_SIZE * 0.999621916911), (0, 0), align=None)
    chamfer1_2_piece_17b = extrude(amount=14.239107006, mode=Mode.PRIVATE)
    chamfer1_2_piece_17b = split(chamfer1_2_piece_17b, bisect_by=Plane(origin=(0.384902652, 0.484046156, -2.351834392), z_dir=(0.4999999999999998, 0, -0.8660254037844388)), keep=Keep.TOP, mode=Mode.PRIVATE)
    chamfer1_2_piece_17 = chamfer1_2_piece_17a & chamfer1_2_piece_17b
    add(chamfer1_2_piece_17, mode=Mode.SUBTRACT)
    with BuildSketch(Plane(origin=(3.340714197, 0, -4.502820283), x_dir=(-0.4998109584556485, -0.027495876610586382, -0.8656979742248803), z_dir=(-0.8660254037844386, 0, 0.5000000000000001))) as chamfer1_2_piece_18a_section:
        Polygon((CHAMFER1_SIZE * 0.999621916911, -CHAMFER1_SIZE * 0.0274958766106), (-CHAMFER1_SIZE * 0.0274958766106, -CHAMFER1_SIZE * 0.999621916911), (0, 0), align=None)
    chamfer1_2_piece_18a = extrude(amount=14.239107006, mode=Mode.PRIVATE)
    chamfer1_2_piece_18a = split(chamfer1_2_piece_18a, bisect_by=Plane(origin=(-5.65, 0.484046156, 1.132418279), z_dir=(-1, 0, 0)), keep=Keep.TOP, mode=Mode.PRIVATE)
    with BuildSketch(Plane(origin=(-5.65, 0, -3.169553503), x_dir=(-0.9996219169112969, -0.027495876610586382, 0), z_dir=(0, 0, 1))) as chamfer1_2_piece_18b_section:
        Polygon((CHAMFER1_SIZE * 0.999621916911, -CHAMFER1_SIZE * 0.0274958766106), (-CHAMFER1_SIZE * 0.0274958766106, -CHAMFER1_SIZE * 0.999621916911), (0, 0), align=None)
    chamfer1_2_piece_18b = extrude(amount=9.727077985, mode=Mode.PRIVATE)
    chamfer1_2_piece_18b = split(chamfer1_2_piece_18b, bisect_by=Plane(origin=(-5.265097348, 0.484046156, 0.465747329), z_dir=(-0.5000000000000001, 0, -0.8660254037844386)), keep=Keep.TOP, mode=Mode.PRIVATE)
    chamfer1_2_piece_18 = chamfer1_2_piece_18a & chamfer1_2_piece_18b
    add(chamfer1_2_piece_18, mode=Mode.SUBTRACT)


solid = part.part
